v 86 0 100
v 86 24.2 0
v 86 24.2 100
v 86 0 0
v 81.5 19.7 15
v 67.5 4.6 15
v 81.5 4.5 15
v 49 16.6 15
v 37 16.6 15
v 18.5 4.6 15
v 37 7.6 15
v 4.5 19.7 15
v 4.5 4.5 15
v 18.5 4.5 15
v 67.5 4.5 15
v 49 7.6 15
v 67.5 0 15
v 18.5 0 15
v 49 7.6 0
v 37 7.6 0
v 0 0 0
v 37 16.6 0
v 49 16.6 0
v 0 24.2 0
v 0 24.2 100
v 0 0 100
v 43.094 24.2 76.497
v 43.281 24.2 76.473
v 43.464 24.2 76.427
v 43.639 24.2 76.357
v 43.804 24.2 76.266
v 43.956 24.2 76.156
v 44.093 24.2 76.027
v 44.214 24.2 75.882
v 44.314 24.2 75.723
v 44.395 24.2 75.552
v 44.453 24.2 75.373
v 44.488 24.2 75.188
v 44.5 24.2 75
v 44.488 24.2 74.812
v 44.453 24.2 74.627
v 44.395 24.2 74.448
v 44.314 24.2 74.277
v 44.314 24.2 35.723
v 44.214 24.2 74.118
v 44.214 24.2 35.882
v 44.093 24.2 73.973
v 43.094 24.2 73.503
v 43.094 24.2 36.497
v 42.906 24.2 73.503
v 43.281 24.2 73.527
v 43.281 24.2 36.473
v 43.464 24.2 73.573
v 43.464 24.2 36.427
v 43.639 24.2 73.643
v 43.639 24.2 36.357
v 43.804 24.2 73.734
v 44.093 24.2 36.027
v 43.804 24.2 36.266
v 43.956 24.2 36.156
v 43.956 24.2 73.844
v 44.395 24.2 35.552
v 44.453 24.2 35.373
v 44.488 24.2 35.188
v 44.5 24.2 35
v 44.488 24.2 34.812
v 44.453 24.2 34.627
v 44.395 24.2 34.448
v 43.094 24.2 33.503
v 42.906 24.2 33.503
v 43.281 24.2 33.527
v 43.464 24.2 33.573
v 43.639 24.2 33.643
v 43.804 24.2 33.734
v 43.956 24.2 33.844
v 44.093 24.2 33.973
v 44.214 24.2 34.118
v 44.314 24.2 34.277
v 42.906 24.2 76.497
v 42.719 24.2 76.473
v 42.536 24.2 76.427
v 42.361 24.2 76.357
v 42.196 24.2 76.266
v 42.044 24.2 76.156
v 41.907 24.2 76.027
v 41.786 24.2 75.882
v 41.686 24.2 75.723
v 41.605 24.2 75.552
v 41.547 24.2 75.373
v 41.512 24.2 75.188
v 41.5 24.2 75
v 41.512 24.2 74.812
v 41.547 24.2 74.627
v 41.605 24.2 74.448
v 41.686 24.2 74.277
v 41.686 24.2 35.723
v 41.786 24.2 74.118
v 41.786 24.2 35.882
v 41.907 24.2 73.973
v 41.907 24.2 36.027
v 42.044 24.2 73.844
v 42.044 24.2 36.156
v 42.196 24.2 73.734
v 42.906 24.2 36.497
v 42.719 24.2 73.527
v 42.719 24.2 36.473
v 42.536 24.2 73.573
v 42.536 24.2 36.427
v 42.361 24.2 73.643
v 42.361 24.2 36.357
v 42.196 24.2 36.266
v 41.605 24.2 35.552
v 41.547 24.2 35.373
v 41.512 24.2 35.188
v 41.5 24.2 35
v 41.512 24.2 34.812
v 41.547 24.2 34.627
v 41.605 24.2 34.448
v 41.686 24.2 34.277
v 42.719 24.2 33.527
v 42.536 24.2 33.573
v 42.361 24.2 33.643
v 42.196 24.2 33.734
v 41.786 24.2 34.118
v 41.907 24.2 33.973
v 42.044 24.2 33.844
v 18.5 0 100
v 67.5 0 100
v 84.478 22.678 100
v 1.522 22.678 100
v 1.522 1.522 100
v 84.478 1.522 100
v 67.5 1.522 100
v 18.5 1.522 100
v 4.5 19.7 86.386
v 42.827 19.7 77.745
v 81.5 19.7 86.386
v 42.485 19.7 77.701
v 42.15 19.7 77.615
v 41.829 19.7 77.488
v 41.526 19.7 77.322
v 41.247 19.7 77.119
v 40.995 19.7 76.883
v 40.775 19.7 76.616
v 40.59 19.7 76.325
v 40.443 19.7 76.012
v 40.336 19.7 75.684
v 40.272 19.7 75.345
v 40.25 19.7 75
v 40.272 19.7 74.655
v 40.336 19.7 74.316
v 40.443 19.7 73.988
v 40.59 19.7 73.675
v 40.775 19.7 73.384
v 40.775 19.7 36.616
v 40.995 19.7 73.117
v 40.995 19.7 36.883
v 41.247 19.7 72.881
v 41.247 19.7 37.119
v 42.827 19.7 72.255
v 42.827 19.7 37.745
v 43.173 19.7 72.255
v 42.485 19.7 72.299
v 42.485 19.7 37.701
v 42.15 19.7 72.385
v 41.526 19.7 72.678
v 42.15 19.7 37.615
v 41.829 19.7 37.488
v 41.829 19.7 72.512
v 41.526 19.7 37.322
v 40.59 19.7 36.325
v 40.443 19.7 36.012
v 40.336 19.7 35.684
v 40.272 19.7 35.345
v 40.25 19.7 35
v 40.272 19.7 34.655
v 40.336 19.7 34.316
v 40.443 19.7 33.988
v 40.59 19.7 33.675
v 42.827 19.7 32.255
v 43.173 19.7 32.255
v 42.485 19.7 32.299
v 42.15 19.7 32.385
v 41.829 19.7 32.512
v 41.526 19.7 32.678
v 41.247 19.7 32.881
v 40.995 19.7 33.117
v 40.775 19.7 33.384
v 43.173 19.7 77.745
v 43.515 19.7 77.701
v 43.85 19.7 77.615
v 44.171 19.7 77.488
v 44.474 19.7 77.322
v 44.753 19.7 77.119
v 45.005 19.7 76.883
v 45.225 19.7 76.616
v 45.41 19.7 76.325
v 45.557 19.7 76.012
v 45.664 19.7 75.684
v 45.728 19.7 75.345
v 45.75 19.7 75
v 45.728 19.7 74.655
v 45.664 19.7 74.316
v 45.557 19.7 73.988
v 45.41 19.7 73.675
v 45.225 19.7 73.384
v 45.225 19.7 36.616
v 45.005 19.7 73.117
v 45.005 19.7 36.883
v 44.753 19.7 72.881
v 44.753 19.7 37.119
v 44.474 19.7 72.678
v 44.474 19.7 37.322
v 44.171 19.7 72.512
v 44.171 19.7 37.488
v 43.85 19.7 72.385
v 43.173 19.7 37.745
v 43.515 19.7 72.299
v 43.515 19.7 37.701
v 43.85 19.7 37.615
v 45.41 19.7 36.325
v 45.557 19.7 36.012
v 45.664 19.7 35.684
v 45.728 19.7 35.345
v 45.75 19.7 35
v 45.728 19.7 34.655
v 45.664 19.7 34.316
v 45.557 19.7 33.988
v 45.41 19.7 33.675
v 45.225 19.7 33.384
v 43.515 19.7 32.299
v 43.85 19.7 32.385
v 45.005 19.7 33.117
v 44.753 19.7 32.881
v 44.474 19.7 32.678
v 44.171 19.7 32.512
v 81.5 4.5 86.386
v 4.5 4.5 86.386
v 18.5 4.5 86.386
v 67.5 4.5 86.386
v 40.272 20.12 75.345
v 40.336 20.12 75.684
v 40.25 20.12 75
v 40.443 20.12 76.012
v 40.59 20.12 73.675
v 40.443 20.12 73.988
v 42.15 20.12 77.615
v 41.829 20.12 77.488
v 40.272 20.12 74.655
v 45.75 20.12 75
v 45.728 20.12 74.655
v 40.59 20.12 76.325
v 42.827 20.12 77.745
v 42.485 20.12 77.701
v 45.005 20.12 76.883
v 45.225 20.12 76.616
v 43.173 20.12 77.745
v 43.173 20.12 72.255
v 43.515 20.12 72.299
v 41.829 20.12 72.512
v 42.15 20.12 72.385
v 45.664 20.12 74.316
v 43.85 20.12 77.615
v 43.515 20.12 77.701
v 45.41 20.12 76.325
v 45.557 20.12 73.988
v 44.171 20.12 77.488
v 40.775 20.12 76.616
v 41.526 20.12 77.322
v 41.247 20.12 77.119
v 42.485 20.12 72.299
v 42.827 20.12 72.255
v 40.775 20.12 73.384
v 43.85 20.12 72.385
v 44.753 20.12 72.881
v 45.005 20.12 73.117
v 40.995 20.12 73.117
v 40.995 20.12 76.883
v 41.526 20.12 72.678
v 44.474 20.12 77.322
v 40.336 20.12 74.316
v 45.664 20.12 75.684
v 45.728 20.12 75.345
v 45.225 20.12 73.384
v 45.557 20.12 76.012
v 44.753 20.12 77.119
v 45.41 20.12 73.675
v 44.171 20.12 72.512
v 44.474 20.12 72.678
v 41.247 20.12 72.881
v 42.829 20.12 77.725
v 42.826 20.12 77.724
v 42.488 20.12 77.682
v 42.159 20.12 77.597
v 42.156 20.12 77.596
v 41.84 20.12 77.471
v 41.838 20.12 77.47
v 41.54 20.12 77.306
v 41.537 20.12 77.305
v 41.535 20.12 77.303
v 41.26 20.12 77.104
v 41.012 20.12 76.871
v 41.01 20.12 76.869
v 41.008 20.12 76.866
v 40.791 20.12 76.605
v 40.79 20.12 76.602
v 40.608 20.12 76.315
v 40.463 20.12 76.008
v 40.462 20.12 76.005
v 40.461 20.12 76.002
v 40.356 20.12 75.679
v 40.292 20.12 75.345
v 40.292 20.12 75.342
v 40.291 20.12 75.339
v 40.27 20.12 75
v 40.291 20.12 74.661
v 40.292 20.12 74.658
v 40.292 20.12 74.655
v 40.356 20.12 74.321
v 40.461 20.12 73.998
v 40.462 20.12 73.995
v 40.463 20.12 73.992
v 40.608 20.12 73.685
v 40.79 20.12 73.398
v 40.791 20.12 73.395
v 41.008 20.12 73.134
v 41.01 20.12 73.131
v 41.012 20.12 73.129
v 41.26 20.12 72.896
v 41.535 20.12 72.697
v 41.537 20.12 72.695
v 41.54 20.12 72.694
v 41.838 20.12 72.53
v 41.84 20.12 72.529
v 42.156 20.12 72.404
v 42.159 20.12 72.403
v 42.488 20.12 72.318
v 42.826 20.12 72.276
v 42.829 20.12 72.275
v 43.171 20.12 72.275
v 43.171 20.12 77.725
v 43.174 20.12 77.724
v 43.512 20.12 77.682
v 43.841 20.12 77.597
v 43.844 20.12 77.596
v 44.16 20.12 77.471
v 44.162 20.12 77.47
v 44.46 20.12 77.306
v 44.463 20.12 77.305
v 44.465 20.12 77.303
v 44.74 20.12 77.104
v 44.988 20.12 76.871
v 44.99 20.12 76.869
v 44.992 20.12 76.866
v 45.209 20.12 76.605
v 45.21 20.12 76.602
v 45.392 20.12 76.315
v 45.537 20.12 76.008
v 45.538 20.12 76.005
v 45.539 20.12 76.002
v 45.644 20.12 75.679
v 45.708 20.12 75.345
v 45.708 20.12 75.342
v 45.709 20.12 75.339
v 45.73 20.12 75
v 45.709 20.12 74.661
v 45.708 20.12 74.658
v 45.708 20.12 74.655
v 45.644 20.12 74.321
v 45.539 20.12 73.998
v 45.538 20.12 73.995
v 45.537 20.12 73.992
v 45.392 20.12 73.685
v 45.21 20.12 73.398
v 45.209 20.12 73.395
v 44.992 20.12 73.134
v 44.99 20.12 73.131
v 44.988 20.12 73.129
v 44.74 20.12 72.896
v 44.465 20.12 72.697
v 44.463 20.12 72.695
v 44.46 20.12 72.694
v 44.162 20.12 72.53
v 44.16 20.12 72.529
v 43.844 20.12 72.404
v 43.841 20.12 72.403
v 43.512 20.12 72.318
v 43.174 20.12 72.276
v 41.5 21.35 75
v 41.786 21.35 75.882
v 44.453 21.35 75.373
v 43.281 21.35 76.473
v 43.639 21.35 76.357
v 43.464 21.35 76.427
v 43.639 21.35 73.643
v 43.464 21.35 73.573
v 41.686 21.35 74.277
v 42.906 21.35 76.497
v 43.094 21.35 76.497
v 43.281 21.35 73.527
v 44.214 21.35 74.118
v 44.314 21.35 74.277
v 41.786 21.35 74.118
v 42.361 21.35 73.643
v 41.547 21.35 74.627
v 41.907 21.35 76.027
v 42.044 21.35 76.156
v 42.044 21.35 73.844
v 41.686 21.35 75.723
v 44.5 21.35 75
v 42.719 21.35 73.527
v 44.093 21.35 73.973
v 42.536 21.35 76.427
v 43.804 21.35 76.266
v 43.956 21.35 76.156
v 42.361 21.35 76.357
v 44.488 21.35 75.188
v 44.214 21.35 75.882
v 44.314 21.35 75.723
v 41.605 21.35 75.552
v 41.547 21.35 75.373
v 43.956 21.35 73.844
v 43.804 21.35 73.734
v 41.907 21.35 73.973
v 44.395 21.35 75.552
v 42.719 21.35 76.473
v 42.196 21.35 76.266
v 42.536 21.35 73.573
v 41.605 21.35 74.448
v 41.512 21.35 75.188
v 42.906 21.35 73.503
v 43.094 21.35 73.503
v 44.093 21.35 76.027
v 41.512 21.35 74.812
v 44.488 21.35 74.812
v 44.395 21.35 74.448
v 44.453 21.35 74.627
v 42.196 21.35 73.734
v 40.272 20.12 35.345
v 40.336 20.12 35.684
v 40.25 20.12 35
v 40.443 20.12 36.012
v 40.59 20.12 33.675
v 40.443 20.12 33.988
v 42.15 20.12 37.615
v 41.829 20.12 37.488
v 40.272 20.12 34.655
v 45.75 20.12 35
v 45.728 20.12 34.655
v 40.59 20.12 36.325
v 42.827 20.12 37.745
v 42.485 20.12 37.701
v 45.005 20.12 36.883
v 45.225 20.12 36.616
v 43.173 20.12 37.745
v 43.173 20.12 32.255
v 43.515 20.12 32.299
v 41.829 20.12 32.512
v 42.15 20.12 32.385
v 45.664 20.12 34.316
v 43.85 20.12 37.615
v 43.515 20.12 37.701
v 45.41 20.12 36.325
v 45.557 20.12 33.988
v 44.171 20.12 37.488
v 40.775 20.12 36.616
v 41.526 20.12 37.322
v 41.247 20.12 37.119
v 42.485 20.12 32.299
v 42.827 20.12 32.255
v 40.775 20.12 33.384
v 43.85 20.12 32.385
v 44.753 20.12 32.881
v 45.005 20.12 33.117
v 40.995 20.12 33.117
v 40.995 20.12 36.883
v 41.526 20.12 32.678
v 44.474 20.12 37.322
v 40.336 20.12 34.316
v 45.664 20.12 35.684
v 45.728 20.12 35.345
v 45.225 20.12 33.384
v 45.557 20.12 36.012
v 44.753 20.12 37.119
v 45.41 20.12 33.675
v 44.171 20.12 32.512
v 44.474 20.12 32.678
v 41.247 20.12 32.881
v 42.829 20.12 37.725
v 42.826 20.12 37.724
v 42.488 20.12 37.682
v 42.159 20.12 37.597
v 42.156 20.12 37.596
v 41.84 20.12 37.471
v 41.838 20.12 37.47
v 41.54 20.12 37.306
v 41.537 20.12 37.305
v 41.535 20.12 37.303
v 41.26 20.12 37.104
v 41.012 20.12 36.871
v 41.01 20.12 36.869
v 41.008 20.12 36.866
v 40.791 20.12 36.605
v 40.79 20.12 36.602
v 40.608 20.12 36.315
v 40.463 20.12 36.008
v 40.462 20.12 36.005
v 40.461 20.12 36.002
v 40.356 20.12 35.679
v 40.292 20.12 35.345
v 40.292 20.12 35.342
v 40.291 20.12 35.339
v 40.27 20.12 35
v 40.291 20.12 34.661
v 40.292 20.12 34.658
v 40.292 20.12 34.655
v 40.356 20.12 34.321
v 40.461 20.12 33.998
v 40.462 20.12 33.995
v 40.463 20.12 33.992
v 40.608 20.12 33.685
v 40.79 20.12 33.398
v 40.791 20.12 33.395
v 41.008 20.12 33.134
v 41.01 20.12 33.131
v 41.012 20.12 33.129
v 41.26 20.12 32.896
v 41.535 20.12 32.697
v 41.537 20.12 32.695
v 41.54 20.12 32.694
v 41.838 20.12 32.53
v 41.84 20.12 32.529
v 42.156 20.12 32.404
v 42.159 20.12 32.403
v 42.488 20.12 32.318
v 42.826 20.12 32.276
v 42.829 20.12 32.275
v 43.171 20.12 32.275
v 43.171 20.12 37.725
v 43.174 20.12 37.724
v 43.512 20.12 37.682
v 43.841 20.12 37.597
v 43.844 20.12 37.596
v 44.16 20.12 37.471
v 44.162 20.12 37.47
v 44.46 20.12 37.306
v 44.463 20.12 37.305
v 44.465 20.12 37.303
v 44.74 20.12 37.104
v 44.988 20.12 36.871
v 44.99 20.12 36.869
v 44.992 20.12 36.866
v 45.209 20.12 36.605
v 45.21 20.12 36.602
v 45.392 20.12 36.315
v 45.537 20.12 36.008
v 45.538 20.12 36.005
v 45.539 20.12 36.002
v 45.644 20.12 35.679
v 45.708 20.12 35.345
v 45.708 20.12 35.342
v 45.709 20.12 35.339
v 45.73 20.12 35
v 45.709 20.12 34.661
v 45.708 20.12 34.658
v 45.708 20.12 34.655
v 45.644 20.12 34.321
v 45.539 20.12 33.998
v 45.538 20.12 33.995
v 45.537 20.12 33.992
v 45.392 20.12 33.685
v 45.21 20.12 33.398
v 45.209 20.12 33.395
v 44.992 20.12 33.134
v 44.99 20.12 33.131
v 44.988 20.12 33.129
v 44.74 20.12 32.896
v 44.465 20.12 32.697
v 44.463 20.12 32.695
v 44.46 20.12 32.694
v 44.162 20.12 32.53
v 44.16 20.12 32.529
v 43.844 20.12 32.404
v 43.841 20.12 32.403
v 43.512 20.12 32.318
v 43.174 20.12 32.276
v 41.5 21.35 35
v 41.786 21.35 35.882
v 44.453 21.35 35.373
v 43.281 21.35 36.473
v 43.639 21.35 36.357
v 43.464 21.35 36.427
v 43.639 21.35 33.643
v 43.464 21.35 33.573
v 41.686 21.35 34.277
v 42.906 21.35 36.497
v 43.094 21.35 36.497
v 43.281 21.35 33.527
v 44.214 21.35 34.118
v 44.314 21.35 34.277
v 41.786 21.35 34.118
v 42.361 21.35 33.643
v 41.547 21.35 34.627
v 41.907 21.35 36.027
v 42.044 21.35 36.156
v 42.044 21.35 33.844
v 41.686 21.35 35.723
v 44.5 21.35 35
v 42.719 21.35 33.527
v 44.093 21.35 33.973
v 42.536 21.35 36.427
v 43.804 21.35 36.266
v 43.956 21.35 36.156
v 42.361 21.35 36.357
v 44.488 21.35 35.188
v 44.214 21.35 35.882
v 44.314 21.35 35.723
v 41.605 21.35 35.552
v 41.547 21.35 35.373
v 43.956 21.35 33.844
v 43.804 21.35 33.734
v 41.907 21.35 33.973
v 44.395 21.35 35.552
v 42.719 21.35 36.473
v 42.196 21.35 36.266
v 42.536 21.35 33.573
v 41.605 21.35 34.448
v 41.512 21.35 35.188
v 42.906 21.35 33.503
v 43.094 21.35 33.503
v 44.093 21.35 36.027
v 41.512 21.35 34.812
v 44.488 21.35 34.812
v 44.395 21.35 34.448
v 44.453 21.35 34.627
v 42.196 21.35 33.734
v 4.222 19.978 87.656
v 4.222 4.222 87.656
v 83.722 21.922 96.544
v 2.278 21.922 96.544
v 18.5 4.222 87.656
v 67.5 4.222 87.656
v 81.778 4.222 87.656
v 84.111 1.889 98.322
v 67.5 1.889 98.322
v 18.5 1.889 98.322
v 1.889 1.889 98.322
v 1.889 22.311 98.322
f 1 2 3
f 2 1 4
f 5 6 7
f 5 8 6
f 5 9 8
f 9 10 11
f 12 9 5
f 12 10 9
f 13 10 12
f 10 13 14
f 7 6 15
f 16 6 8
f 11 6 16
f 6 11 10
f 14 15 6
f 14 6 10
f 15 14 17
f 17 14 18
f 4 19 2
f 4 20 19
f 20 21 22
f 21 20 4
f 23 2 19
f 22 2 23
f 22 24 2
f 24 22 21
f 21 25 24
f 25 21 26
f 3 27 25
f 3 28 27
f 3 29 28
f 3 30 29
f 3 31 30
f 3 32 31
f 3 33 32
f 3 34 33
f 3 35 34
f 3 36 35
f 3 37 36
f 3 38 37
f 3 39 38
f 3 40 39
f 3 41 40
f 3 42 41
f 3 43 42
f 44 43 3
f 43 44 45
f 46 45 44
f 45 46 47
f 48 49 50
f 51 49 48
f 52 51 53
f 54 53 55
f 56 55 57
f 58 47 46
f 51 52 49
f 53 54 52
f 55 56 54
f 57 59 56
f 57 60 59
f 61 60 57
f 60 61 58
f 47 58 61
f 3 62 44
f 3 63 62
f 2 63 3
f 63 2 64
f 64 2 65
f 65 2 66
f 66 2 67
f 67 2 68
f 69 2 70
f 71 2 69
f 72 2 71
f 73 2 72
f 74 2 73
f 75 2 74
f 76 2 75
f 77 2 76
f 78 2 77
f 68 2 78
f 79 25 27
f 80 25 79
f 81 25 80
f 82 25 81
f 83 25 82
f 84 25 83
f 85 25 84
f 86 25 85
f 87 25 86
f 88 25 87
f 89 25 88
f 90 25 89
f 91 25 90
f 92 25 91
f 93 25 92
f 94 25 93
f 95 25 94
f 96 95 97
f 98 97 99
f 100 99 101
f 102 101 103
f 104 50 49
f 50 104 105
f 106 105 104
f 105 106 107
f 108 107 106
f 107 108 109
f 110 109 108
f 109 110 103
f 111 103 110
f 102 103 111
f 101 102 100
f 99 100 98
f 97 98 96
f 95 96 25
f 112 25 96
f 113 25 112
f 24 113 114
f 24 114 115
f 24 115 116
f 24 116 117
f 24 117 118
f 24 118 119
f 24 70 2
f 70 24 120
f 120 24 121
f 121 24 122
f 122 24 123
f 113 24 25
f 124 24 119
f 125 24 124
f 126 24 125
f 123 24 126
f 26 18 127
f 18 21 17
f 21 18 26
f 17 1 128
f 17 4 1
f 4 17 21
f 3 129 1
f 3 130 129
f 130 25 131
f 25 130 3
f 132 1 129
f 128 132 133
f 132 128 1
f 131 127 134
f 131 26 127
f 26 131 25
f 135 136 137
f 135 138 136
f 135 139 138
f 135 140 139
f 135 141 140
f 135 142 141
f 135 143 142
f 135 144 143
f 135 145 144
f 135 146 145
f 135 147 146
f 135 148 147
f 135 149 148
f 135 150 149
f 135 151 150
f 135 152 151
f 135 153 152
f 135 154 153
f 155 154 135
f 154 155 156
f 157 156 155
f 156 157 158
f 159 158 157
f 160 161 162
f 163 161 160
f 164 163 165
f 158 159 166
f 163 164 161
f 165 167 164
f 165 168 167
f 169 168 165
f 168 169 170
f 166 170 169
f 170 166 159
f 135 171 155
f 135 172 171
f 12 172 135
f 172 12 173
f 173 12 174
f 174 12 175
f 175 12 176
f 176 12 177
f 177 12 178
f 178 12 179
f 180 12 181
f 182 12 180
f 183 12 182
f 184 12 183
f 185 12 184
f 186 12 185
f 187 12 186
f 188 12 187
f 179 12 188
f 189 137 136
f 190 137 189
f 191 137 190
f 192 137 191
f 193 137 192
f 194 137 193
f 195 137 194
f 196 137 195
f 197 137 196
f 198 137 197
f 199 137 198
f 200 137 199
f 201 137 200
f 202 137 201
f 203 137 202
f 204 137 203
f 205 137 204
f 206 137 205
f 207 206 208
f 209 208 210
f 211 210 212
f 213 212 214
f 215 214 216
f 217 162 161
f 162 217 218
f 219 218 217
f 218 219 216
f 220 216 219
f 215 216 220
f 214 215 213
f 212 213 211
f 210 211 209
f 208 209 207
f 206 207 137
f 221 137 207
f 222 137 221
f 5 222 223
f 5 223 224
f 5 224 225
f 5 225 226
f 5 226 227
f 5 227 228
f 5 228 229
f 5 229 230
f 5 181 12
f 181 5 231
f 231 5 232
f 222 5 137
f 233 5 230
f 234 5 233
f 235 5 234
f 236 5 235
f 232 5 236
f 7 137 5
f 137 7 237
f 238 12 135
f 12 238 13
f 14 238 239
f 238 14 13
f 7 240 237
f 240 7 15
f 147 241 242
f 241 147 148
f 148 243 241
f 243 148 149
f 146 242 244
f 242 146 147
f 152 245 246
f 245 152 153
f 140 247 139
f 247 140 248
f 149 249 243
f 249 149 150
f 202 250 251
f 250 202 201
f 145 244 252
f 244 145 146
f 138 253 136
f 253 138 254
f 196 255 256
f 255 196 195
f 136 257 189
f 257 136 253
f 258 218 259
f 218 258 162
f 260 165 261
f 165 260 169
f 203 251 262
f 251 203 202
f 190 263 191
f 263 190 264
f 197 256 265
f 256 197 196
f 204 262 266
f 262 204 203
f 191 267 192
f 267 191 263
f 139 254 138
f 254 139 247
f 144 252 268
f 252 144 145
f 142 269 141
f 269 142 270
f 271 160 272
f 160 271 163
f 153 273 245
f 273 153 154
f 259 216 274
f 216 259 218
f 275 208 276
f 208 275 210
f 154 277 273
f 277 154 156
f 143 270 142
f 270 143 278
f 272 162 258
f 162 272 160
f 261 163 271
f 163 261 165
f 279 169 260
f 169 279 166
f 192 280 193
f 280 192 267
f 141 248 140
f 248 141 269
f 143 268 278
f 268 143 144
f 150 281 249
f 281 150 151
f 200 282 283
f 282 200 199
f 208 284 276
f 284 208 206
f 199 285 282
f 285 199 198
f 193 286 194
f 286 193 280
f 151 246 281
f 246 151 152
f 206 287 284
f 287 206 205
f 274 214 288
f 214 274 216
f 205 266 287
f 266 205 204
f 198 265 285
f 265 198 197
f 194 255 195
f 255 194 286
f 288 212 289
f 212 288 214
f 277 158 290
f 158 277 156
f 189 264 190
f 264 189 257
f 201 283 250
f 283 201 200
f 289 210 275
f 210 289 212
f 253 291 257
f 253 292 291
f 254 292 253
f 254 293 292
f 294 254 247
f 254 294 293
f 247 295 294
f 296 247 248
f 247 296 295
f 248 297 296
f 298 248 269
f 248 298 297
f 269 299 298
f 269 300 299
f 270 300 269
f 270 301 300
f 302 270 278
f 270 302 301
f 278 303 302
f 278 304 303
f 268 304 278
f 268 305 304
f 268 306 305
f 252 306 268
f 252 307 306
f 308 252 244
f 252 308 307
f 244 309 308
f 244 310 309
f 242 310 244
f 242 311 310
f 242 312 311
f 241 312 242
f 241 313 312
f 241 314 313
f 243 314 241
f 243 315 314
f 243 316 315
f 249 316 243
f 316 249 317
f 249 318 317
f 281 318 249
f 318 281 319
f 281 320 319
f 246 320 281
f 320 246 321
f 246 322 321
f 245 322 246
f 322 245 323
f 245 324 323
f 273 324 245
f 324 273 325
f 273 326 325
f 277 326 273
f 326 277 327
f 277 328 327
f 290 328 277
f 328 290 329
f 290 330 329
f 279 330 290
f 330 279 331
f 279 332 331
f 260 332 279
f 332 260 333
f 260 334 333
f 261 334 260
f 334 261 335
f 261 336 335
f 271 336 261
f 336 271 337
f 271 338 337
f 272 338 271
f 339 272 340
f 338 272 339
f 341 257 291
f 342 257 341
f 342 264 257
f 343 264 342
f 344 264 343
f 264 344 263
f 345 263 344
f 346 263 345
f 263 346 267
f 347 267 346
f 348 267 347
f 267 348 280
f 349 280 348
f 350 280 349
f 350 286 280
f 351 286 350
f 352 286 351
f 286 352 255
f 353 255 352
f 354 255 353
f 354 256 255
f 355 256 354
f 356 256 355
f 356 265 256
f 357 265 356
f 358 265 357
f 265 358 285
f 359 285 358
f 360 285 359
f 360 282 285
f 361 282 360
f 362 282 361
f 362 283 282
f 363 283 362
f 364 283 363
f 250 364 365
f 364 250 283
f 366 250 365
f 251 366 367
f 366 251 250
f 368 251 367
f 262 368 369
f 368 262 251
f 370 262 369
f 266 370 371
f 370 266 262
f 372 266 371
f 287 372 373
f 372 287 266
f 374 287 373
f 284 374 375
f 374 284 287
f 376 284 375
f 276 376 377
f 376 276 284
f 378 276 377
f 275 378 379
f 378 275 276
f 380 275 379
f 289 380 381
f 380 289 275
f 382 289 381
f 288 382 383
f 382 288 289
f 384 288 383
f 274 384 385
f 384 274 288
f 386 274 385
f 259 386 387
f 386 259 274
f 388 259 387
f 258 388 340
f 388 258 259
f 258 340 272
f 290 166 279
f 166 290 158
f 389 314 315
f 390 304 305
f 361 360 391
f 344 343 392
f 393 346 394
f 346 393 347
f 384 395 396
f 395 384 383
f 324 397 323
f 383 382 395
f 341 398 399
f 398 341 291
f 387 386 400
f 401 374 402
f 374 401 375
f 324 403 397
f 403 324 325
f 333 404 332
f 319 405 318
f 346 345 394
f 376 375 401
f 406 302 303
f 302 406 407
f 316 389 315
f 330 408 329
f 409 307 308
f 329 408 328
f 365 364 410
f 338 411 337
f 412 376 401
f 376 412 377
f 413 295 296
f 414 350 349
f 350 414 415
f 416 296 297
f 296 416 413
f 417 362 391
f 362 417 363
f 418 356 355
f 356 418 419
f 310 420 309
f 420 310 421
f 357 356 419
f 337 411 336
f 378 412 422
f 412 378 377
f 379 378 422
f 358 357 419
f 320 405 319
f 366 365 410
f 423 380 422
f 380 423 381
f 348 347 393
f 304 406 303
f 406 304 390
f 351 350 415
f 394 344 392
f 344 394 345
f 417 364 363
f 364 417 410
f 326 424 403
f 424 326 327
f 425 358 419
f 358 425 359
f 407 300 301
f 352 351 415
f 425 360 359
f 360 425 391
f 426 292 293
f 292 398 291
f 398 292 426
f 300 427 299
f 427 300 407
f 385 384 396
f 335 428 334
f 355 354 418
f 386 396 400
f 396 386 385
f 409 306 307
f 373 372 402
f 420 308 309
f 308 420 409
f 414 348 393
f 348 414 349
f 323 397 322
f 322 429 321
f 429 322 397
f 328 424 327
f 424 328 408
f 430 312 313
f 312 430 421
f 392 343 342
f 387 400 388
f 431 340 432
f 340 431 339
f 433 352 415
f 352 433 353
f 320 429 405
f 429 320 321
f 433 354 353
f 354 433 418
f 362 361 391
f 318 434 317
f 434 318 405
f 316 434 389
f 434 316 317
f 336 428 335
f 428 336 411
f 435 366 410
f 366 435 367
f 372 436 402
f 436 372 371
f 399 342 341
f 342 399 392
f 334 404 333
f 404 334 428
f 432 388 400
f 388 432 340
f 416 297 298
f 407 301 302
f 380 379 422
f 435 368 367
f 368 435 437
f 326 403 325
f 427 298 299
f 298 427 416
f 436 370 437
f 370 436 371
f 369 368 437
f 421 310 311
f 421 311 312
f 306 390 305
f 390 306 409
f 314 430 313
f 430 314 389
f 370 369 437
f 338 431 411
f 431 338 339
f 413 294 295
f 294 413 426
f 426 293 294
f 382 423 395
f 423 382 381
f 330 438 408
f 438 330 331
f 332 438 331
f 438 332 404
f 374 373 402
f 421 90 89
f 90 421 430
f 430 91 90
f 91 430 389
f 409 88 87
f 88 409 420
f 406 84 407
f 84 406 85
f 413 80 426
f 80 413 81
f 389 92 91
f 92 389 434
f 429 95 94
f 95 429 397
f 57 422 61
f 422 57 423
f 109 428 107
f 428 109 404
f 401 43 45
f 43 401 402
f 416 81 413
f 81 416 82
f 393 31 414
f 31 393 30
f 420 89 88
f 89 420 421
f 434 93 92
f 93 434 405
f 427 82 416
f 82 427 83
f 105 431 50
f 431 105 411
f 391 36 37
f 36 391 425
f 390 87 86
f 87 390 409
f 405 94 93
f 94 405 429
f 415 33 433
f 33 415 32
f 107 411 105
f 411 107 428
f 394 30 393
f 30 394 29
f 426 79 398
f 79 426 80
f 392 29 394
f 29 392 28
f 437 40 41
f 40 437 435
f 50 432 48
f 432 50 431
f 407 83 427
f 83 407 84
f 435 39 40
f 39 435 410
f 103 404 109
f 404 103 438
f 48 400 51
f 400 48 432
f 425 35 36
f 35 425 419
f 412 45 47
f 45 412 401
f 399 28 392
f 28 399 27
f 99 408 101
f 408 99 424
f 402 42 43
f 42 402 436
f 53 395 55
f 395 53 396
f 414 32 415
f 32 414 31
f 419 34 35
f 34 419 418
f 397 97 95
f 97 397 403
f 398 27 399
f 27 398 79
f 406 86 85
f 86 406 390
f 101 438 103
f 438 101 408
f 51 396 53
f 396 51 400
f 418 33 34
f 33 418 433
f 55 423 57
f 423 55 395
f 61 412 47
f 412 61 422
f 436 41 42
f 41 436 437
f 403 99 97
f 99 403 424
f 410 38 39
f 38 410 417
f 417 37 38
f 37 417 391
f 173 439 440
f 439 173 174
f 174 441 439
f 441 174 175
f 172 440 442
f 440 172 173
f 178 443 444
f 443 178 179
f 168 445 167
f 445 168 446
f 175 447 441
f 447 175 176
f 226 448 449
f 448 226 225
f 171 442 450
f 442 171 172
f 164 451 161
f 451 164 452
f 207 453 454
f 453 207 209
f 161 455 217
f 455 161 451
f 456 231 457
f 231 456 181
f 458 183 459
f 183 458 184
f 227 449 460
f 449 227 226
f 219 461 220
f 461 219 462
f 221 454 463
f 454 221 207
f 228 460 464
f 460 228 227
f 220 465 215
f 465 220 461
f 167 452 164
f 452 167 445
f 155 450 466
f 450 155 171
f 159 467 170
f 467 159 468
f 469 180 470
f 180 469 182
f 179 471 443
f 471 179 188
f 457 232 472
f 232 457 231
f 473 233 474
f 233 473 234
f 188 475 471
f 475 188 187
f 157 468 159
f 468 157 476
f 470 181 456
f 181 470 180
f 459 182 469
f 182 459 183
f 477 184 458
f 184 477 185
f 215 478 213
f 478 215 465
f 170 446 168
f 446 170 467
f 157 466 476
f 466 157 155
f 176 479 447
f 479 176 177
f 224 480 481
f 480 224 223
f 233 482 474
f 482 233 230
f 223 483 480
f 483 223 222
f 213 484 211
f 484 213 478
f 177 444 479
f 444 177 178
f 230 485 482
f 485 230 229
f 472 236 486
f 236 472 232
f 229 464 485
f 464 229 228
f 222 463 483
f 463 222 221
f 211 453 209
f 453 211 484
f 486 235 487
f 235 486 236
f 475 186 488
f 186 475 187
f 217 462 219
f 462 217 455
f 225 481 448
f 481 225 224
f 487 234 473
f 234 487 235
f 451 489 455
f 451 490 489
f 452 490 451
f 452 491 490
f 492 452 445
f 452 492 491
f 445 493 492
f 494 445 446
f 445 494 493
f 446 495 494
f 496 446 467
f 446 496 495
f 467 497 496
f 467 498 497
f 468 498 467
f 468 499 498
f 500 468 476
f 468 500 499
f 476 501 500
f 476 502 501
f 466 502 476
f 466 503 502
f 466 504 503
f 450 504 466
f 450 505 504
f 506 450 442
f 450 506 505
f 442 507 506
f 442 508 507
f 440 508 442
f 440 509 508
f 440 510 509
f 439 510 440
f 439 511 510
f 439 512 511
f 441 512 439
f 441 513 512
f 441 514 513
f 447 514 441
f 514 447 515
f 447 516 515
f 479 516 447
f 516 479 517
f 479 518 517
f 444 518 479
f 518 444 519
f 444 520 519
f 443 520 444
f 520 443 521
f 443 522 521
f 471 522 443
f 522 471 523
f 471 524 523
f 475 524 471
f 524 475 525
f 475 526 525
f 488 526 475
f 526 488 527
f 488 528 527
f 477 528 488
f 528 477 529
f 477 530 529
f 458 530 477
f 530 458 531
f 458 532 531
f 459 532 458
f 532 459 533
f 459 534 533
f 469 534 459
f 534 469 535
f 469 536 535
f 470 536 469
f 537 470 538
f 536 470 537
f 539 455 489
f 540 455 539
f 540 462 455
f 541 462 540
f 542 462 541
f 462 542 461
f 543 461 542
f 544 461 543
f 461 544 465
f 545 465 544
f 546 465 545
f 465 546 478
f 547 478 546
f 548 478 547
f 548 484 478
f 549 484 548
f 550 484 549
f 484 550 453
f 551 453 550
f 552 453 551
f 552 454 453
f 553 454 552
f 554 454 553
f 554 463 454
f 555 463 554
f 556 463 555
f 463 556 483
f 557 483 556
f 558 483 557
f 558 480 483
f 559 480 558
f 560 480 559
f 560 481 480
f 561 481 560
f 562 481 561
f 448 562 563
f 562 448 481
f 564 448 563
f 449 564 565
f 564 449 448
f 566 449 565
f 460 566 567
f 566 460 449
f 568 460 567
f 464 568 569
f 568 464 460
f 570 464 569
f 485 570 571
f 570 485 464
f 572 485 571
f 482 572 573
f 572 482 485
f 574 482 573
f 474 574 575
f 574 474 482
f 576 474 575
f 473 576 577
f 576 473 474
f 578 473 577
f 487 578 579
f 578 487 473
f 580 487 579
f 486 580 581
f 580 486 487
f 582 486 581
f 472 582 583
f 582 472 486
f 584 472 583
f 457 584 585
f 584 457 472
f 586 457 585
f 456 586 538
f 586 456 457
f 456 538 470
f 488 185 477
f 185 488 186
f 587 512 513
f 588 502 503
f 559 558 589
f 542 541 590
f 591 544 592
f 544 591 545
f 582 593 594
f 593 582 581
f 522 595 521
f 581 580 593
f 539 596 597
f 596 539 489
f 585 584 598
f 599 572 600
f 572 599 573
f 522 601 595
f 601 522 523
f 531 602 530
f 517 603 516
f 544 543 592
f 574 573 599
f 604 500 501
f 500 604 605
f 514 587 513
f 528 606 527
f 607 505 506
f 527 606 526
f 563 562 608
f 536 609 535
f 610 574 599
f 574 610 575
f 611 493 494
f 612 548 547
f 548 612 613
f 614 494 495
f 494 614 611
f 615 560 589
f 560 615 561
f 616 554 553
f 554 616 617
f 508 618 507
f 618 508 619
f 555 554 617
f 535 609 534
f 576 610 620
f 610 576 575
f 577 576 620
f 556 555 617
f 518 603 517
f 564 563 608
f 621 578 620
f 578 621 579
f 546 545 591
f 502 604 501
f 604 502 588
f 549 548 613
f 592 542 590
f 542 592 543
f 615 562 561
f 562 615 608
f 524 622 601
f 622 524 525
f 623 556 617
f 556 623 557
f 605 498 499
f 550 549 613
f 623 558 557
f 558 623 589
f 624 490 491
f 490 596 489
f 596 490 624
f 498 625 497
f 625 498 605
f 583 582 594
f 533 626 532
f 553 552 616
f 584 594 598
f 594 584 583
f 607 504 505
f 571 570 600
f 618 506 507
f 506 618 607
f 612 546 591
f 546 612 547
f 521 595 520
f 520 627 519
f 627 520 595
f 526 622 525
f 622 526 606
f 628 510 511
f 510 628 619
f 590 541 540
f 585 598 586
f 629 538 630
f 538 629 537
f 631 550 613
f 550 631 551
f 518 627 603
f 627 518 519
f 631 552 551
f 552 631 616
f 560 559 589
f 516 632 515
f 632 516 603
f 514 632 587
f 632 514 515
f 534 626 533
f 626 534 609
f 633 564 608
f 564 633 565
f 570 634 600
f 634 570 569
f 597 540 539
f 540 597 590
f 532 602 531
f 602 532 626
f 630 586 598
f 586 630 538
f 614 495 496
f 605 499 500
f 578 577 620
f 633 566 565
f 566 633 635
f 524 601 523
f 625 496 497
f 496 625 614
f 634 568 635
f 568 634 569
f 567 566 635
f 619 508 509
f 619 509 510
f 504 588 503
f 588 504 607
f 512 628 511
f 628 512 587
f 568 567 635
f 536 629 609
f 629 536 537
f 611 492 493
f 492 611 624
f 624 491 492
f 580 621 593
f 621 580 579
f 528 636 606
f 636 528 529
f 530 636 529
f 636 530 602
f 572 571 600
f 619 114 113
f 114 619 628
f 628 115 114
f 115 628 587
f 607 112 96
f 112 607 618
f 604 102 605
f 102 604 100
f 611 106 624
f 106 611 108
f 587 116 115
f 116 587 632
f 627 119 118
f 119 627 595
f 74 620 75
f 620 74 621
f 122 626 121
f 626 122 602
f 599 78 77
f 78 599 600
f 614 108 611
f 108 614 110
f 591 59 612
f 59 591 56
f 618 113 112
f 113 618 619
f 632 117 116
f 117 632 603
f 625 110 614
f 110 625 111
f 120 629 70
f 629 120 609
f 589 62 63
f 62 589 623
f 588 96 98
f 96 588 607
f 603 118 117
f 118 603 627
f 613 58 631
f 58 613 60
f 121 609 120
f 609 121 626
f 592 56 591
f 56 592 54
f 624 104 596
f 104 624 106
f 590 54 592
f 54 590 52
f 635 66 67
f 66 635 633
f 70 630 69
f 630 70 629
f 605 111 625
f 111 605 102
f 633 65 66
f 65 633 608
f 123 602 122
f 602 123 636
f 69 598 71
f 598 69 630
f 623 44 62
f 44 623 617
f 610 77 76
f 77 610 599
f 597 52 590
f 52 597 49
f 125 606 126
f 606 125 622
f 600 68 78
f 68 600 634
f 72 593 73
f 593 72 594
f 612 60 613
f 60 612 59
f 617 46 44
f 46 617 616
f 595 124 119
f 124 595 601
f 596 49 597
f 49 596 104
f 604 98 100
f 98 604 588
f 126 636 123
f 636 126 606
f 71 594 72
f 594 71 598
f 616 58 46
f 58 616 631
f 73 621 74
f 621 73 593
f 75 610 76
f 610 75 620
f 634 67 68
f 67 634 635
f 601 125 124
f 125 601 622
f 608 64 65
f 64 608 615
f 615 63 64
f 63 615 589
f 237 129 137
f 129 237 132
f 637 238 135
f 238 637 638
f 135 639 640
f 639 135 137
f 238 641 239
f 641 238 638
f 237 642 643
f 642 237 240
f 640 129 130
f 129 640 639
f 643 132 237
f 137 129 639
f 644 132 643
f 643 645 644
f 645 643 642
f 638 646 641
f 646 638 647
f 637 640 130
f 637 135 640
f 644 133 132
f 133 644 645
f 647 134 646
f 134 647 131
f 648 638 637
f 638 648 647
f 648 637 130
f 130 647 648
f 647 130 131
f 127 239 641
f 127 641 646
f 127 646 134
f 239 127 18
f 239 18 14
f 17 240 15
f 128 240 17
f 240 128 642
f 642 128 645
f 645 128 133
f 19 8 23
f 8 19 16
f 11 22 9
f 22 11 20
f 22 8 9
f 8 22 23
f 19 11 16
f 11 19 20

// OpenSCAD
//-------------------------------
// wszystkie ywmiary w mm
//-------------------------------
//wysokosc calkowita
wymz=100;
//szerokosc telefony
telszer=77;
//grubosc telefonu
telgr=15.2;
//grubosc scianboki
grscianboki=4.5;
//grubosc podstawa
grscianpodstawa=grscianboki;
//grubosc scian gora
grsciangora=grscianboki;
//grubosc bazy pod wtyczke
grbaza=15.0;

//skos przy wejsciu telefonu:
skosdlugosc=16;
skospocylenie=7;

//szerokosc bokow trzymajacych 
otwmarg=14;

wymx=telszer+2*grscianboki;
wymy=telgr+grsciangora+grscianpodstawa;


module dziury(){
translate([wymx/2,wymy-grscianboki,wymz-25]) rotate([90,0,0]) wkret_stozek(3.0,h=10);
translate([wymx/2,wymy-grscianboki,grbaza+20]) rotate([90,0,0]) wkret_stozek(3.0,h=10);
}



module wkret_stozek(sred,h=20){
    d_2=(sred==2.9)?5.5:
        (sred==3.0)?5.5:
        (sred==2.2)?3.8:
        (sred==2.5)?4.7:
        (sred==3.5)?7.3:
        (sred==4.0)?8.2:
        (sred==3.9)?7.5:0;        
    dip=(sred==2.9)?1.65:
        (sred==3.0)?1.65:
        (sred==3.5)?2.35:
        (sred==2.2)?1.2:
        (sred==2.5)?1.5:
        (sred==4.0)?2.7:
        (sred==3.9)?2.7:0;        
    sreotw=sred;
    hleb=(d_2-sred)/2;
    rotate([0,180,0]) union(){
        translate([0,0,-0.02])
        cylinder(d=d_2,h=dip-hleb+0.04, $fn=50);
        translate([0,0,dip-hleb])
        cylinder(d1=d_2,d2=sred,h=hleb, $fn=50);
        cylinder(d=sreotw,h=h, $fn=50);
    }
}




module skos(){
    margin = 6;
    skwyx=telszer+margin;
    skwyy=telgr+margin;
    scale([1,1,-1])
    translate([wymx/2,wymy/2,-wymz-0.1])
    linear_extrude(skosdlugosc,scale=[(skwyx-skospocylenie)/skwyx,(skwyy-skospocylenie)/skwyy]) square([skwyx,skwyy],center = true);
}


module otworprzod(){    
    szerotw=telszer-2*otwmarg;
    translate([ (wymx-szerotw)/2,grsciangora+0.1,grbaza])
    rotate([90,0,0])
    linear_extrude(grsciangora+0.2)        
        square([szerotw,wymz]);         
 }



module main(){
cube([wymx,wymy,grbaza]);
translate([0,wymy-grscianpodstawa,0]) cube([wymx,grscianpodstawa,wymz]);
translate([wymx-grscianboki,0,0]) cube([grscianboki,wymy,wymz]);
cube([grscianboki,wymy,wymz]);
cube([wymx,grscianpodstawa,wymz]);
};


//miejsce na wtyczke
wtx=12;
wty=9;


difference(){
    main();
    skos();
    otworprzod();
    dziury();
    
    translate([wymx/2-wtx/2,wymy/2-wty/2,0])
    cube([wtx,wty,grbaza]);
    
    
    
}


    
